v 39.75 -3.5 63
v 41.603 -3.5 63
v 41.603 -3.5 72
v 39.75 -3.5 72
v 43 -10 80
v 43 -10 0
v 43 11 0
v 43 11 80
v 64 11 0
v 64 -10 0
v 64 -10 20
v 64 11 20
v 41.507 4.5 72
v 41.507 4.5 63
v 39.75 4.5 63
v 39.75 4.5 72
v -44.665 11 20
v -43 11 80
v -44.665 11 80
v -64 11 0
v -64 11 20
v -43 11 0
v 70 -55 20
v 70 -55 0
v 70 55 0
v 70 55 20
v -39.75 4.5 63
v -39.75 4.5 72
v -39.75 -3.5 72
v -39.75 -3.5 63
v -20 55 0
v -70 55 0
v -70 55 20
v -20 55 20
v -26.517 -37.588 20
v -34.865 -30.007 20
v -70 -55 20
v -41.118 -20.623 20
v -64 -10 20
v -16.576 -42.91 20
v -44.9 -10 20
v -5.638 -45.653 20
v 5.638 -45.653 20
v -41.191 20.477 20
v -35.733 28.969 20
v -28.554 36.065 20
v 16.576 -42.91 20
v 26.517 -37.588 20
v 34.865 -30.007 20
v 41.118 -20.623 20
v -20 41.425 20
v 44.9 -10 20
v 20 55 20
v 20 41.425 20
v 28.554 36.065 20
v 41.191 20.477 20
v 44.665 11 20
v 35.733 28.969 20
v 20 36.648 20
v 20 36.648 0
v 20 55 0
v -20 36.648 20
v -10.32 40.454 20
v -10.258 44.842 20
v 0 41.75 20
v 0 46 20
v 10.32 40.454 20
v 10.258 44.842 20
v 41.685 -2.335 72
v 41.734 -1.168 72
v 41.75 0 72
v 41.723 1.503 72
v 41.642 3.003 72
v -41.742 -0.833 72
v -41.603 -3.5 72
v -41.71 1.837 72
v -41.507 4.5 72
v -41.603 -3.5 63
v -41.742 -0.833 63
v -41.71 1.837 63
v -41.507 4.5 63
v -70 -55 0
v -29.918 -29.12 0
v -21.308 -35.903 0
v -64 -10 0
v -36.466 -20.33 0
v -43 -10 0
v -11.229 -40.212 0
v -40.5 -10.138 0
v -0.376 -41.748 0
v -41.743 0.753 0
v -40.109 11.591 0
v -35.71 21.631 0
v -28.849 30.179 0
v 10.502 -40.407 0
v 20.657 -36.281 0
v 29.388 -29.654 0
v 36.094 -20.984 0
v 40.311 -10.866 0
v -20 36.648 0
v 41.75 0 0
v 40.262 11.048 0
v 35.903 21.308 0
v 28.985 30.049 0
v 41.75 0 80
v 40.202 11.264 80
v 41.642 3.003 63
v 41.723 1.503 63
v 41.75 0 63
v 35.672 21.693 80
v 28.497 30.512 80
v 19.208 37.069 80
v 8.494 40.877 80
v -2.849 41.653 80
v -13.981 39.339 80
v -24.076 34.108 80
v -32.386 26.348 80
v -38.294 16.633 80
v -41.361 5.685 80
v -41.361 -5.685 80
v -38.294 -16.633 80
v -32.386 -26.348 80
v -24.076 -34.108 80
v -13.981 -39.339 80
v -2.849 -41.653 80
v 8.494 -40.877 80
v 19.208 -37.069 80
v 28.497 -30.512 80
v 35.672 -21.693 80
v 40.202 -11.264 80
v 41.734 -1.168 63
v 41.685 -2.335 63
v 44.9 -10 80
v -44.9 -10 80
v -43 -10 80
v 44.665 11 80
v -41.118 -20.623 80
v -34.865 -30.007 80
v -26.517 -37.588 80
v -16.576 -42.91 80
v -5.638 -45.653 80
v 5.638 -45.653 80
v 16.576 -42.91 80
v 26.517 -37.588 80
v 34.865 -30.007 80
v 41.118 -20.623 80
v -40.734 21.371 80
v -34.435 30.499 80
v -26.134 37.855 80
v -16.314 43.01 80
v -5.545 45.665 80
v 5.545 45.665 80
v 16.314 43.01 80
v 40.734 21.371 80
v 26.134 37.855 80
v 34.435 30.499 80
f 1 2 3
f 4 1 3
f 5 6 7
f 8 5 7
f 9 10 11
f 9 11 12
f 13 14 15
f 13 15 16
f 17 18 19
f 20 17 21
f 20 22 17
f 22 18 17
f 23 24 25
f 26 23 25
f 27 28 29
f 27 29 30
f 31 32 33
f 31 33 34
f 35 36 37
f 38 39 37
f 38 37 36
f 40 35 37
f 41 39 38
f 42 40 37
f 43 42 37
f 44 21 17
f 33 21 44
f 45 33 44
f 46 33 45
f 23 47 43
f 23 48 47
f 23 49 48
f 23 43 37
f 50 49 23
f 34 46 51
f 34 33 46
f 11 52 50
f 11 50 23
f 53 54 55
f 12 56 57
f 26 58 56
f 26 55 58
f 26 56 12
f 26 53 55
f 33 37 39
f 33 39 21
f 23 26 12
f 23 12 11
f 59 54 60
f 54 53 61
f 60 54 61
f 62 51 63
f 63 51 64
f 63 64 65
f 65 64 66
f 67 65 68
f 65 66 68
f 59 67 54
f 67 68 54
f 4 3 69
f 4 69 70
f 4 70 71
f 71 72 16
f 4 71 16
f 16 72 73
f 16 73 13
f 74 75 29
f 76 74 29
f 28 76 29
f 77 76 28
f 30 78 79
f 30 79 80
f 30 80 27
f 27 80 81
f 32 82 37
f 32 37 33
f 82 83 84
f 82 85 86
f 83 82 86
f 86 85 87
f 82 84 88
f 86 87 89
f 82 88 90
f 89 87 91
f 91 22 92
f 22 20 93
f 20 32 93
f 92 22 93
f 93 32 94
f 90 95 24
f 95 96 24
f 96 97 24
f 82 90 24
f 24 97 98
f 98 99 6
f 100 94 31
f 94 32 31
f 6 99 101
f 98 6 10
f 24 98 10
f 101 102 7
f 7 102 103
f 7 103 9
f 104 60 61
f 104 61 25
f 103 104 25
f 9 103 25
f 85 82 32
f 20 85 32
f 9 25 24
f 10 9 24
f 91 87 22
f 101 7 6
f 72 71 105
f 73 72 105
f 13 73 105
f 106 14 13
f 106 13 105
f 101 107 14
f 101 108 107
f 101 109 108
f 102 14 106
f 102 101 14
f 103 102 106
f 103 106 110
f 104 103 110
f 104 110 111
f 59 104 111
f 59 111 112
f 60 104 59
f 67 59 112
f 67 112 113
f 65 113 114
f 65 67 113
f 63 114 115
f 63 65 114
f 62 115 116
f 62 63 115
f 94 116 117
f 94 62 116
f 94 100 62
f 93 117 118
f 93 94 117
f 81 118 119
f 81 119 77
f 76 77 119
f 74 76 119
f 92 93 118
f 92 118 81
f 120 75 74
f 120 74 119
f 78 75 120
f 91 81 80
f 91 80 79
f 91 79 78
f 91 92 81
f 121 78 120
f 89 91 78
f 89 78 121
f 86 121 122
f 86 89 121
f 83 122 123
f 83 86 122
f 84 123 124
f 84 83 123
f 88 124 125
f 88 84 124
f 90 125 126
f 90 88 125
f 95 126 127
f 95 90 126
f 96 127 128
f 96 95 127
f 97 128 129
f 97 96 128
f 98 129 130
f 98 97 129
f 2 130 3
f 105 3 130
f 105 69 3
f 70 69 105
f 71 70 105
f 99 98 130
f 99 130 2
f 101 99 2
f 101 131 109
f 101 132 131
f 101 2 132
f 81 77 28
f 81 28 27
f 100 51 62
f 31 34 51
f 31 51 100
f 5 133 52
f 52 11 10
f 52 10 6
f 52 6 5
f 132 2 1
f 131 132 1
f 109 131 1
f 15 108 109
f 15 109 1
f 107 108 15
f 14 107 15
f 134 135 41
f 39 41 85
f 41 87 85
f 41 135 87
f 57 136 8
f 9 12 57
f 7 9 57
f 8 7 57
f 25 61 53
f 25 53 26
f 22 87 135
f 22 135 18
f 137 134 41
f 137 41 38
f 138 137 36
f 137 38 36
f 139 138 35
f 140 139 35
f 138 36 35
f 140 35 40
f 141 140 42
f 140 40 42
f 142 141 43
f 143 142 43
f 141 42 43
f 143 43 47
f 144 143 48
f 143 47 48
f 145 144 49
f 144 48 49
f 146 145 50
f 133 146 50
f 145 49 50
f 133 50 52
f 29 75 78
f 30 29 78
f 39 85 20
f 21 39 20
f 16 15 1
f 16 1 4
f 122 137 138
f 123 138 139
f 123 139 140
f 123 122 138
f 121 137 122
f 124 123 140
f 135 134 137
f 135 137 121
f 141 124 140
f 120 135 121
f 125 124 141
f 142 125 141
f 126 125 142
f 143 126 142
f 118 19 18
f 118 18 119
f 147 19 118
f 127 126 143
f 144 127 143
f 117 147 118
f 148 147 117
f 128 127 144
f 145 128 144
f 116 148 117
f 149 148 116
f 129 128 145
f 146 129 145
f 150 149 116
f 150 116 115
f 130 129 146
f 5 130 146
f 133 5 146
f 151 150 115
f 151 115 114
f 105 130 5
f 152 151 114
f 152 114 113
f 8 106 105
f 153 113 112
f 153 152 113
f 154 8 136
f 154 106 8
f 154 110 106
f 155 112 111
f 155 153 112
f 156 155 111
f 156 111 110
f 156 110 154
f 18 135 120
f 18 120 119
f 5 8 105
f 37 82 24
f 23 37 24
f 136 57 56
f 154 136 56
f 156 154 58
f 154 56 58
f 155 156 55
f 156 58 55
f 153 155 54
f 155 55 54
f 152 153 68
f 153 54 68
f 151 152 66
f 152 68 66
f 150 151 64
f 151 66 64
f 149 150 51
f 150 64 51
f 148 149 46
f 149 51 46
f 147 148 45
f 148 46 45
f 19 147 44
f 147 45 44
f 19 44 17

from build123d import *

# Parameters (mm, degrees)
SKETCH_1_W          = 140
SKETCH_1_H          = 110
SKETCH_1_R          = 41.75
EXTRUDE_2_DEPTH     = 20
SKETCH_3_R          = 46
SKETCH_3_R_2        = 41.75
EXTRUDE_3_DEPTH     = 60
SKETCH_4_W          = 21
SKETCH_4_H          = 21
CUT_EXTRUDE_1_DEPTH = 81
SKETCH_6_W          = 9
SKETCH_6_H          = 8
EXTRUDE_4_DEPTH     = 2
SKETCH_7_W          = 9
SKETCH_7_H          = 8
EXTRUDE_5_DEPTH     = 2
CUT_EXTRUDE_2_REACH = 112
SKETCH_8_W          = 40
SKETCH_8_H          = 20


with BuildPart() as part:
    # 草圖1 → 填料-伸長2 (new body)
    with BuildSketch(Plane.XY):
        Rectangle(SKETCH_1_W, SKETCH_1_H)
        Circle(SKETCH_1_R, mode=Mode.SUBTRACT)
    extrude(amount=EXTRUDE_2_DEPTH)

    # 草圖3 → 填料-伸長3 (add)
    with BuildSketch(Plane.XY.offset(20)):
        Circle(SKETCH_3_R)
        Circle(SKETCH_3_R_2, mode=Mode.SUBTRACT)
    extrude(amount=EXTRUDE_3_DEPTH)

    # 草圖4 → 除料-伸長1 (cut, through all)
    with BuildSketch(Plane(origin=(0, 0, 0), x_dir=(-1, 0, 0), z_dir=(0, 0, -1))):
        with Locations((53.5, 0.5)):
            Rectangle(SKETCH_4_W, SKETCH_4_H)
        with Locations((-53.5, 0.5)):
            Rectangle(SKETCH_4_W, SKETCH_4_H)
    extrude(amount=-CUT_EXTRUDE_1_DEPTH, mode=Mode.SUBTRACT)

    # 草圖6 → 填料-伸長4 (add)
    with BuildSketch(Plane(origin=(-41.75, 0, 0), x_dir=(0, 0, -1), z_dir=(1, 0, 0))):
        with Locations((-67.5, 0.5)):
            Rectangle(SKETCH_6_W, SKETCH_6_H)
    extrude(amount=EXTRUDE_4_DEPTH)

    # 草圖7 → 填料-伸長5 (add)
    with BuildSketch(Plane.ZY.offset(-41.75)):
        with Locations((67.5, 0.5)):
            Rectangle(SKETCH_7_W, SKETCH_7_H)
    extrude(amount=EXTRUDE_5_DEPTH)

    # 草圖8 → 除料-伸長2 (cut, up to next)
    with BuildSketch(Plane(origin=(0, 55, 0), x_dir=(1, 0, 0), z_dir=(0, 1, 0)), mode=Mode.PRIVATE) as cut_extrude_2_sk1:
        with Locations((0, -10)):
            Rectangle(SKETCH_8_W, SKETCH_8_H)
    cut_extrude_2_tool1 = extrude(cut_extrude_2_sk1.sketch, amount=-CUT_EXTRUDE_2_REACH, mode=Mode.PRIVATE) & part.part
    add(cut_extrude_2_tool1.solids().sort_by_distance((0, 55, 10))[0], mode=Mode.SUBTRACT)


solid = part.part
